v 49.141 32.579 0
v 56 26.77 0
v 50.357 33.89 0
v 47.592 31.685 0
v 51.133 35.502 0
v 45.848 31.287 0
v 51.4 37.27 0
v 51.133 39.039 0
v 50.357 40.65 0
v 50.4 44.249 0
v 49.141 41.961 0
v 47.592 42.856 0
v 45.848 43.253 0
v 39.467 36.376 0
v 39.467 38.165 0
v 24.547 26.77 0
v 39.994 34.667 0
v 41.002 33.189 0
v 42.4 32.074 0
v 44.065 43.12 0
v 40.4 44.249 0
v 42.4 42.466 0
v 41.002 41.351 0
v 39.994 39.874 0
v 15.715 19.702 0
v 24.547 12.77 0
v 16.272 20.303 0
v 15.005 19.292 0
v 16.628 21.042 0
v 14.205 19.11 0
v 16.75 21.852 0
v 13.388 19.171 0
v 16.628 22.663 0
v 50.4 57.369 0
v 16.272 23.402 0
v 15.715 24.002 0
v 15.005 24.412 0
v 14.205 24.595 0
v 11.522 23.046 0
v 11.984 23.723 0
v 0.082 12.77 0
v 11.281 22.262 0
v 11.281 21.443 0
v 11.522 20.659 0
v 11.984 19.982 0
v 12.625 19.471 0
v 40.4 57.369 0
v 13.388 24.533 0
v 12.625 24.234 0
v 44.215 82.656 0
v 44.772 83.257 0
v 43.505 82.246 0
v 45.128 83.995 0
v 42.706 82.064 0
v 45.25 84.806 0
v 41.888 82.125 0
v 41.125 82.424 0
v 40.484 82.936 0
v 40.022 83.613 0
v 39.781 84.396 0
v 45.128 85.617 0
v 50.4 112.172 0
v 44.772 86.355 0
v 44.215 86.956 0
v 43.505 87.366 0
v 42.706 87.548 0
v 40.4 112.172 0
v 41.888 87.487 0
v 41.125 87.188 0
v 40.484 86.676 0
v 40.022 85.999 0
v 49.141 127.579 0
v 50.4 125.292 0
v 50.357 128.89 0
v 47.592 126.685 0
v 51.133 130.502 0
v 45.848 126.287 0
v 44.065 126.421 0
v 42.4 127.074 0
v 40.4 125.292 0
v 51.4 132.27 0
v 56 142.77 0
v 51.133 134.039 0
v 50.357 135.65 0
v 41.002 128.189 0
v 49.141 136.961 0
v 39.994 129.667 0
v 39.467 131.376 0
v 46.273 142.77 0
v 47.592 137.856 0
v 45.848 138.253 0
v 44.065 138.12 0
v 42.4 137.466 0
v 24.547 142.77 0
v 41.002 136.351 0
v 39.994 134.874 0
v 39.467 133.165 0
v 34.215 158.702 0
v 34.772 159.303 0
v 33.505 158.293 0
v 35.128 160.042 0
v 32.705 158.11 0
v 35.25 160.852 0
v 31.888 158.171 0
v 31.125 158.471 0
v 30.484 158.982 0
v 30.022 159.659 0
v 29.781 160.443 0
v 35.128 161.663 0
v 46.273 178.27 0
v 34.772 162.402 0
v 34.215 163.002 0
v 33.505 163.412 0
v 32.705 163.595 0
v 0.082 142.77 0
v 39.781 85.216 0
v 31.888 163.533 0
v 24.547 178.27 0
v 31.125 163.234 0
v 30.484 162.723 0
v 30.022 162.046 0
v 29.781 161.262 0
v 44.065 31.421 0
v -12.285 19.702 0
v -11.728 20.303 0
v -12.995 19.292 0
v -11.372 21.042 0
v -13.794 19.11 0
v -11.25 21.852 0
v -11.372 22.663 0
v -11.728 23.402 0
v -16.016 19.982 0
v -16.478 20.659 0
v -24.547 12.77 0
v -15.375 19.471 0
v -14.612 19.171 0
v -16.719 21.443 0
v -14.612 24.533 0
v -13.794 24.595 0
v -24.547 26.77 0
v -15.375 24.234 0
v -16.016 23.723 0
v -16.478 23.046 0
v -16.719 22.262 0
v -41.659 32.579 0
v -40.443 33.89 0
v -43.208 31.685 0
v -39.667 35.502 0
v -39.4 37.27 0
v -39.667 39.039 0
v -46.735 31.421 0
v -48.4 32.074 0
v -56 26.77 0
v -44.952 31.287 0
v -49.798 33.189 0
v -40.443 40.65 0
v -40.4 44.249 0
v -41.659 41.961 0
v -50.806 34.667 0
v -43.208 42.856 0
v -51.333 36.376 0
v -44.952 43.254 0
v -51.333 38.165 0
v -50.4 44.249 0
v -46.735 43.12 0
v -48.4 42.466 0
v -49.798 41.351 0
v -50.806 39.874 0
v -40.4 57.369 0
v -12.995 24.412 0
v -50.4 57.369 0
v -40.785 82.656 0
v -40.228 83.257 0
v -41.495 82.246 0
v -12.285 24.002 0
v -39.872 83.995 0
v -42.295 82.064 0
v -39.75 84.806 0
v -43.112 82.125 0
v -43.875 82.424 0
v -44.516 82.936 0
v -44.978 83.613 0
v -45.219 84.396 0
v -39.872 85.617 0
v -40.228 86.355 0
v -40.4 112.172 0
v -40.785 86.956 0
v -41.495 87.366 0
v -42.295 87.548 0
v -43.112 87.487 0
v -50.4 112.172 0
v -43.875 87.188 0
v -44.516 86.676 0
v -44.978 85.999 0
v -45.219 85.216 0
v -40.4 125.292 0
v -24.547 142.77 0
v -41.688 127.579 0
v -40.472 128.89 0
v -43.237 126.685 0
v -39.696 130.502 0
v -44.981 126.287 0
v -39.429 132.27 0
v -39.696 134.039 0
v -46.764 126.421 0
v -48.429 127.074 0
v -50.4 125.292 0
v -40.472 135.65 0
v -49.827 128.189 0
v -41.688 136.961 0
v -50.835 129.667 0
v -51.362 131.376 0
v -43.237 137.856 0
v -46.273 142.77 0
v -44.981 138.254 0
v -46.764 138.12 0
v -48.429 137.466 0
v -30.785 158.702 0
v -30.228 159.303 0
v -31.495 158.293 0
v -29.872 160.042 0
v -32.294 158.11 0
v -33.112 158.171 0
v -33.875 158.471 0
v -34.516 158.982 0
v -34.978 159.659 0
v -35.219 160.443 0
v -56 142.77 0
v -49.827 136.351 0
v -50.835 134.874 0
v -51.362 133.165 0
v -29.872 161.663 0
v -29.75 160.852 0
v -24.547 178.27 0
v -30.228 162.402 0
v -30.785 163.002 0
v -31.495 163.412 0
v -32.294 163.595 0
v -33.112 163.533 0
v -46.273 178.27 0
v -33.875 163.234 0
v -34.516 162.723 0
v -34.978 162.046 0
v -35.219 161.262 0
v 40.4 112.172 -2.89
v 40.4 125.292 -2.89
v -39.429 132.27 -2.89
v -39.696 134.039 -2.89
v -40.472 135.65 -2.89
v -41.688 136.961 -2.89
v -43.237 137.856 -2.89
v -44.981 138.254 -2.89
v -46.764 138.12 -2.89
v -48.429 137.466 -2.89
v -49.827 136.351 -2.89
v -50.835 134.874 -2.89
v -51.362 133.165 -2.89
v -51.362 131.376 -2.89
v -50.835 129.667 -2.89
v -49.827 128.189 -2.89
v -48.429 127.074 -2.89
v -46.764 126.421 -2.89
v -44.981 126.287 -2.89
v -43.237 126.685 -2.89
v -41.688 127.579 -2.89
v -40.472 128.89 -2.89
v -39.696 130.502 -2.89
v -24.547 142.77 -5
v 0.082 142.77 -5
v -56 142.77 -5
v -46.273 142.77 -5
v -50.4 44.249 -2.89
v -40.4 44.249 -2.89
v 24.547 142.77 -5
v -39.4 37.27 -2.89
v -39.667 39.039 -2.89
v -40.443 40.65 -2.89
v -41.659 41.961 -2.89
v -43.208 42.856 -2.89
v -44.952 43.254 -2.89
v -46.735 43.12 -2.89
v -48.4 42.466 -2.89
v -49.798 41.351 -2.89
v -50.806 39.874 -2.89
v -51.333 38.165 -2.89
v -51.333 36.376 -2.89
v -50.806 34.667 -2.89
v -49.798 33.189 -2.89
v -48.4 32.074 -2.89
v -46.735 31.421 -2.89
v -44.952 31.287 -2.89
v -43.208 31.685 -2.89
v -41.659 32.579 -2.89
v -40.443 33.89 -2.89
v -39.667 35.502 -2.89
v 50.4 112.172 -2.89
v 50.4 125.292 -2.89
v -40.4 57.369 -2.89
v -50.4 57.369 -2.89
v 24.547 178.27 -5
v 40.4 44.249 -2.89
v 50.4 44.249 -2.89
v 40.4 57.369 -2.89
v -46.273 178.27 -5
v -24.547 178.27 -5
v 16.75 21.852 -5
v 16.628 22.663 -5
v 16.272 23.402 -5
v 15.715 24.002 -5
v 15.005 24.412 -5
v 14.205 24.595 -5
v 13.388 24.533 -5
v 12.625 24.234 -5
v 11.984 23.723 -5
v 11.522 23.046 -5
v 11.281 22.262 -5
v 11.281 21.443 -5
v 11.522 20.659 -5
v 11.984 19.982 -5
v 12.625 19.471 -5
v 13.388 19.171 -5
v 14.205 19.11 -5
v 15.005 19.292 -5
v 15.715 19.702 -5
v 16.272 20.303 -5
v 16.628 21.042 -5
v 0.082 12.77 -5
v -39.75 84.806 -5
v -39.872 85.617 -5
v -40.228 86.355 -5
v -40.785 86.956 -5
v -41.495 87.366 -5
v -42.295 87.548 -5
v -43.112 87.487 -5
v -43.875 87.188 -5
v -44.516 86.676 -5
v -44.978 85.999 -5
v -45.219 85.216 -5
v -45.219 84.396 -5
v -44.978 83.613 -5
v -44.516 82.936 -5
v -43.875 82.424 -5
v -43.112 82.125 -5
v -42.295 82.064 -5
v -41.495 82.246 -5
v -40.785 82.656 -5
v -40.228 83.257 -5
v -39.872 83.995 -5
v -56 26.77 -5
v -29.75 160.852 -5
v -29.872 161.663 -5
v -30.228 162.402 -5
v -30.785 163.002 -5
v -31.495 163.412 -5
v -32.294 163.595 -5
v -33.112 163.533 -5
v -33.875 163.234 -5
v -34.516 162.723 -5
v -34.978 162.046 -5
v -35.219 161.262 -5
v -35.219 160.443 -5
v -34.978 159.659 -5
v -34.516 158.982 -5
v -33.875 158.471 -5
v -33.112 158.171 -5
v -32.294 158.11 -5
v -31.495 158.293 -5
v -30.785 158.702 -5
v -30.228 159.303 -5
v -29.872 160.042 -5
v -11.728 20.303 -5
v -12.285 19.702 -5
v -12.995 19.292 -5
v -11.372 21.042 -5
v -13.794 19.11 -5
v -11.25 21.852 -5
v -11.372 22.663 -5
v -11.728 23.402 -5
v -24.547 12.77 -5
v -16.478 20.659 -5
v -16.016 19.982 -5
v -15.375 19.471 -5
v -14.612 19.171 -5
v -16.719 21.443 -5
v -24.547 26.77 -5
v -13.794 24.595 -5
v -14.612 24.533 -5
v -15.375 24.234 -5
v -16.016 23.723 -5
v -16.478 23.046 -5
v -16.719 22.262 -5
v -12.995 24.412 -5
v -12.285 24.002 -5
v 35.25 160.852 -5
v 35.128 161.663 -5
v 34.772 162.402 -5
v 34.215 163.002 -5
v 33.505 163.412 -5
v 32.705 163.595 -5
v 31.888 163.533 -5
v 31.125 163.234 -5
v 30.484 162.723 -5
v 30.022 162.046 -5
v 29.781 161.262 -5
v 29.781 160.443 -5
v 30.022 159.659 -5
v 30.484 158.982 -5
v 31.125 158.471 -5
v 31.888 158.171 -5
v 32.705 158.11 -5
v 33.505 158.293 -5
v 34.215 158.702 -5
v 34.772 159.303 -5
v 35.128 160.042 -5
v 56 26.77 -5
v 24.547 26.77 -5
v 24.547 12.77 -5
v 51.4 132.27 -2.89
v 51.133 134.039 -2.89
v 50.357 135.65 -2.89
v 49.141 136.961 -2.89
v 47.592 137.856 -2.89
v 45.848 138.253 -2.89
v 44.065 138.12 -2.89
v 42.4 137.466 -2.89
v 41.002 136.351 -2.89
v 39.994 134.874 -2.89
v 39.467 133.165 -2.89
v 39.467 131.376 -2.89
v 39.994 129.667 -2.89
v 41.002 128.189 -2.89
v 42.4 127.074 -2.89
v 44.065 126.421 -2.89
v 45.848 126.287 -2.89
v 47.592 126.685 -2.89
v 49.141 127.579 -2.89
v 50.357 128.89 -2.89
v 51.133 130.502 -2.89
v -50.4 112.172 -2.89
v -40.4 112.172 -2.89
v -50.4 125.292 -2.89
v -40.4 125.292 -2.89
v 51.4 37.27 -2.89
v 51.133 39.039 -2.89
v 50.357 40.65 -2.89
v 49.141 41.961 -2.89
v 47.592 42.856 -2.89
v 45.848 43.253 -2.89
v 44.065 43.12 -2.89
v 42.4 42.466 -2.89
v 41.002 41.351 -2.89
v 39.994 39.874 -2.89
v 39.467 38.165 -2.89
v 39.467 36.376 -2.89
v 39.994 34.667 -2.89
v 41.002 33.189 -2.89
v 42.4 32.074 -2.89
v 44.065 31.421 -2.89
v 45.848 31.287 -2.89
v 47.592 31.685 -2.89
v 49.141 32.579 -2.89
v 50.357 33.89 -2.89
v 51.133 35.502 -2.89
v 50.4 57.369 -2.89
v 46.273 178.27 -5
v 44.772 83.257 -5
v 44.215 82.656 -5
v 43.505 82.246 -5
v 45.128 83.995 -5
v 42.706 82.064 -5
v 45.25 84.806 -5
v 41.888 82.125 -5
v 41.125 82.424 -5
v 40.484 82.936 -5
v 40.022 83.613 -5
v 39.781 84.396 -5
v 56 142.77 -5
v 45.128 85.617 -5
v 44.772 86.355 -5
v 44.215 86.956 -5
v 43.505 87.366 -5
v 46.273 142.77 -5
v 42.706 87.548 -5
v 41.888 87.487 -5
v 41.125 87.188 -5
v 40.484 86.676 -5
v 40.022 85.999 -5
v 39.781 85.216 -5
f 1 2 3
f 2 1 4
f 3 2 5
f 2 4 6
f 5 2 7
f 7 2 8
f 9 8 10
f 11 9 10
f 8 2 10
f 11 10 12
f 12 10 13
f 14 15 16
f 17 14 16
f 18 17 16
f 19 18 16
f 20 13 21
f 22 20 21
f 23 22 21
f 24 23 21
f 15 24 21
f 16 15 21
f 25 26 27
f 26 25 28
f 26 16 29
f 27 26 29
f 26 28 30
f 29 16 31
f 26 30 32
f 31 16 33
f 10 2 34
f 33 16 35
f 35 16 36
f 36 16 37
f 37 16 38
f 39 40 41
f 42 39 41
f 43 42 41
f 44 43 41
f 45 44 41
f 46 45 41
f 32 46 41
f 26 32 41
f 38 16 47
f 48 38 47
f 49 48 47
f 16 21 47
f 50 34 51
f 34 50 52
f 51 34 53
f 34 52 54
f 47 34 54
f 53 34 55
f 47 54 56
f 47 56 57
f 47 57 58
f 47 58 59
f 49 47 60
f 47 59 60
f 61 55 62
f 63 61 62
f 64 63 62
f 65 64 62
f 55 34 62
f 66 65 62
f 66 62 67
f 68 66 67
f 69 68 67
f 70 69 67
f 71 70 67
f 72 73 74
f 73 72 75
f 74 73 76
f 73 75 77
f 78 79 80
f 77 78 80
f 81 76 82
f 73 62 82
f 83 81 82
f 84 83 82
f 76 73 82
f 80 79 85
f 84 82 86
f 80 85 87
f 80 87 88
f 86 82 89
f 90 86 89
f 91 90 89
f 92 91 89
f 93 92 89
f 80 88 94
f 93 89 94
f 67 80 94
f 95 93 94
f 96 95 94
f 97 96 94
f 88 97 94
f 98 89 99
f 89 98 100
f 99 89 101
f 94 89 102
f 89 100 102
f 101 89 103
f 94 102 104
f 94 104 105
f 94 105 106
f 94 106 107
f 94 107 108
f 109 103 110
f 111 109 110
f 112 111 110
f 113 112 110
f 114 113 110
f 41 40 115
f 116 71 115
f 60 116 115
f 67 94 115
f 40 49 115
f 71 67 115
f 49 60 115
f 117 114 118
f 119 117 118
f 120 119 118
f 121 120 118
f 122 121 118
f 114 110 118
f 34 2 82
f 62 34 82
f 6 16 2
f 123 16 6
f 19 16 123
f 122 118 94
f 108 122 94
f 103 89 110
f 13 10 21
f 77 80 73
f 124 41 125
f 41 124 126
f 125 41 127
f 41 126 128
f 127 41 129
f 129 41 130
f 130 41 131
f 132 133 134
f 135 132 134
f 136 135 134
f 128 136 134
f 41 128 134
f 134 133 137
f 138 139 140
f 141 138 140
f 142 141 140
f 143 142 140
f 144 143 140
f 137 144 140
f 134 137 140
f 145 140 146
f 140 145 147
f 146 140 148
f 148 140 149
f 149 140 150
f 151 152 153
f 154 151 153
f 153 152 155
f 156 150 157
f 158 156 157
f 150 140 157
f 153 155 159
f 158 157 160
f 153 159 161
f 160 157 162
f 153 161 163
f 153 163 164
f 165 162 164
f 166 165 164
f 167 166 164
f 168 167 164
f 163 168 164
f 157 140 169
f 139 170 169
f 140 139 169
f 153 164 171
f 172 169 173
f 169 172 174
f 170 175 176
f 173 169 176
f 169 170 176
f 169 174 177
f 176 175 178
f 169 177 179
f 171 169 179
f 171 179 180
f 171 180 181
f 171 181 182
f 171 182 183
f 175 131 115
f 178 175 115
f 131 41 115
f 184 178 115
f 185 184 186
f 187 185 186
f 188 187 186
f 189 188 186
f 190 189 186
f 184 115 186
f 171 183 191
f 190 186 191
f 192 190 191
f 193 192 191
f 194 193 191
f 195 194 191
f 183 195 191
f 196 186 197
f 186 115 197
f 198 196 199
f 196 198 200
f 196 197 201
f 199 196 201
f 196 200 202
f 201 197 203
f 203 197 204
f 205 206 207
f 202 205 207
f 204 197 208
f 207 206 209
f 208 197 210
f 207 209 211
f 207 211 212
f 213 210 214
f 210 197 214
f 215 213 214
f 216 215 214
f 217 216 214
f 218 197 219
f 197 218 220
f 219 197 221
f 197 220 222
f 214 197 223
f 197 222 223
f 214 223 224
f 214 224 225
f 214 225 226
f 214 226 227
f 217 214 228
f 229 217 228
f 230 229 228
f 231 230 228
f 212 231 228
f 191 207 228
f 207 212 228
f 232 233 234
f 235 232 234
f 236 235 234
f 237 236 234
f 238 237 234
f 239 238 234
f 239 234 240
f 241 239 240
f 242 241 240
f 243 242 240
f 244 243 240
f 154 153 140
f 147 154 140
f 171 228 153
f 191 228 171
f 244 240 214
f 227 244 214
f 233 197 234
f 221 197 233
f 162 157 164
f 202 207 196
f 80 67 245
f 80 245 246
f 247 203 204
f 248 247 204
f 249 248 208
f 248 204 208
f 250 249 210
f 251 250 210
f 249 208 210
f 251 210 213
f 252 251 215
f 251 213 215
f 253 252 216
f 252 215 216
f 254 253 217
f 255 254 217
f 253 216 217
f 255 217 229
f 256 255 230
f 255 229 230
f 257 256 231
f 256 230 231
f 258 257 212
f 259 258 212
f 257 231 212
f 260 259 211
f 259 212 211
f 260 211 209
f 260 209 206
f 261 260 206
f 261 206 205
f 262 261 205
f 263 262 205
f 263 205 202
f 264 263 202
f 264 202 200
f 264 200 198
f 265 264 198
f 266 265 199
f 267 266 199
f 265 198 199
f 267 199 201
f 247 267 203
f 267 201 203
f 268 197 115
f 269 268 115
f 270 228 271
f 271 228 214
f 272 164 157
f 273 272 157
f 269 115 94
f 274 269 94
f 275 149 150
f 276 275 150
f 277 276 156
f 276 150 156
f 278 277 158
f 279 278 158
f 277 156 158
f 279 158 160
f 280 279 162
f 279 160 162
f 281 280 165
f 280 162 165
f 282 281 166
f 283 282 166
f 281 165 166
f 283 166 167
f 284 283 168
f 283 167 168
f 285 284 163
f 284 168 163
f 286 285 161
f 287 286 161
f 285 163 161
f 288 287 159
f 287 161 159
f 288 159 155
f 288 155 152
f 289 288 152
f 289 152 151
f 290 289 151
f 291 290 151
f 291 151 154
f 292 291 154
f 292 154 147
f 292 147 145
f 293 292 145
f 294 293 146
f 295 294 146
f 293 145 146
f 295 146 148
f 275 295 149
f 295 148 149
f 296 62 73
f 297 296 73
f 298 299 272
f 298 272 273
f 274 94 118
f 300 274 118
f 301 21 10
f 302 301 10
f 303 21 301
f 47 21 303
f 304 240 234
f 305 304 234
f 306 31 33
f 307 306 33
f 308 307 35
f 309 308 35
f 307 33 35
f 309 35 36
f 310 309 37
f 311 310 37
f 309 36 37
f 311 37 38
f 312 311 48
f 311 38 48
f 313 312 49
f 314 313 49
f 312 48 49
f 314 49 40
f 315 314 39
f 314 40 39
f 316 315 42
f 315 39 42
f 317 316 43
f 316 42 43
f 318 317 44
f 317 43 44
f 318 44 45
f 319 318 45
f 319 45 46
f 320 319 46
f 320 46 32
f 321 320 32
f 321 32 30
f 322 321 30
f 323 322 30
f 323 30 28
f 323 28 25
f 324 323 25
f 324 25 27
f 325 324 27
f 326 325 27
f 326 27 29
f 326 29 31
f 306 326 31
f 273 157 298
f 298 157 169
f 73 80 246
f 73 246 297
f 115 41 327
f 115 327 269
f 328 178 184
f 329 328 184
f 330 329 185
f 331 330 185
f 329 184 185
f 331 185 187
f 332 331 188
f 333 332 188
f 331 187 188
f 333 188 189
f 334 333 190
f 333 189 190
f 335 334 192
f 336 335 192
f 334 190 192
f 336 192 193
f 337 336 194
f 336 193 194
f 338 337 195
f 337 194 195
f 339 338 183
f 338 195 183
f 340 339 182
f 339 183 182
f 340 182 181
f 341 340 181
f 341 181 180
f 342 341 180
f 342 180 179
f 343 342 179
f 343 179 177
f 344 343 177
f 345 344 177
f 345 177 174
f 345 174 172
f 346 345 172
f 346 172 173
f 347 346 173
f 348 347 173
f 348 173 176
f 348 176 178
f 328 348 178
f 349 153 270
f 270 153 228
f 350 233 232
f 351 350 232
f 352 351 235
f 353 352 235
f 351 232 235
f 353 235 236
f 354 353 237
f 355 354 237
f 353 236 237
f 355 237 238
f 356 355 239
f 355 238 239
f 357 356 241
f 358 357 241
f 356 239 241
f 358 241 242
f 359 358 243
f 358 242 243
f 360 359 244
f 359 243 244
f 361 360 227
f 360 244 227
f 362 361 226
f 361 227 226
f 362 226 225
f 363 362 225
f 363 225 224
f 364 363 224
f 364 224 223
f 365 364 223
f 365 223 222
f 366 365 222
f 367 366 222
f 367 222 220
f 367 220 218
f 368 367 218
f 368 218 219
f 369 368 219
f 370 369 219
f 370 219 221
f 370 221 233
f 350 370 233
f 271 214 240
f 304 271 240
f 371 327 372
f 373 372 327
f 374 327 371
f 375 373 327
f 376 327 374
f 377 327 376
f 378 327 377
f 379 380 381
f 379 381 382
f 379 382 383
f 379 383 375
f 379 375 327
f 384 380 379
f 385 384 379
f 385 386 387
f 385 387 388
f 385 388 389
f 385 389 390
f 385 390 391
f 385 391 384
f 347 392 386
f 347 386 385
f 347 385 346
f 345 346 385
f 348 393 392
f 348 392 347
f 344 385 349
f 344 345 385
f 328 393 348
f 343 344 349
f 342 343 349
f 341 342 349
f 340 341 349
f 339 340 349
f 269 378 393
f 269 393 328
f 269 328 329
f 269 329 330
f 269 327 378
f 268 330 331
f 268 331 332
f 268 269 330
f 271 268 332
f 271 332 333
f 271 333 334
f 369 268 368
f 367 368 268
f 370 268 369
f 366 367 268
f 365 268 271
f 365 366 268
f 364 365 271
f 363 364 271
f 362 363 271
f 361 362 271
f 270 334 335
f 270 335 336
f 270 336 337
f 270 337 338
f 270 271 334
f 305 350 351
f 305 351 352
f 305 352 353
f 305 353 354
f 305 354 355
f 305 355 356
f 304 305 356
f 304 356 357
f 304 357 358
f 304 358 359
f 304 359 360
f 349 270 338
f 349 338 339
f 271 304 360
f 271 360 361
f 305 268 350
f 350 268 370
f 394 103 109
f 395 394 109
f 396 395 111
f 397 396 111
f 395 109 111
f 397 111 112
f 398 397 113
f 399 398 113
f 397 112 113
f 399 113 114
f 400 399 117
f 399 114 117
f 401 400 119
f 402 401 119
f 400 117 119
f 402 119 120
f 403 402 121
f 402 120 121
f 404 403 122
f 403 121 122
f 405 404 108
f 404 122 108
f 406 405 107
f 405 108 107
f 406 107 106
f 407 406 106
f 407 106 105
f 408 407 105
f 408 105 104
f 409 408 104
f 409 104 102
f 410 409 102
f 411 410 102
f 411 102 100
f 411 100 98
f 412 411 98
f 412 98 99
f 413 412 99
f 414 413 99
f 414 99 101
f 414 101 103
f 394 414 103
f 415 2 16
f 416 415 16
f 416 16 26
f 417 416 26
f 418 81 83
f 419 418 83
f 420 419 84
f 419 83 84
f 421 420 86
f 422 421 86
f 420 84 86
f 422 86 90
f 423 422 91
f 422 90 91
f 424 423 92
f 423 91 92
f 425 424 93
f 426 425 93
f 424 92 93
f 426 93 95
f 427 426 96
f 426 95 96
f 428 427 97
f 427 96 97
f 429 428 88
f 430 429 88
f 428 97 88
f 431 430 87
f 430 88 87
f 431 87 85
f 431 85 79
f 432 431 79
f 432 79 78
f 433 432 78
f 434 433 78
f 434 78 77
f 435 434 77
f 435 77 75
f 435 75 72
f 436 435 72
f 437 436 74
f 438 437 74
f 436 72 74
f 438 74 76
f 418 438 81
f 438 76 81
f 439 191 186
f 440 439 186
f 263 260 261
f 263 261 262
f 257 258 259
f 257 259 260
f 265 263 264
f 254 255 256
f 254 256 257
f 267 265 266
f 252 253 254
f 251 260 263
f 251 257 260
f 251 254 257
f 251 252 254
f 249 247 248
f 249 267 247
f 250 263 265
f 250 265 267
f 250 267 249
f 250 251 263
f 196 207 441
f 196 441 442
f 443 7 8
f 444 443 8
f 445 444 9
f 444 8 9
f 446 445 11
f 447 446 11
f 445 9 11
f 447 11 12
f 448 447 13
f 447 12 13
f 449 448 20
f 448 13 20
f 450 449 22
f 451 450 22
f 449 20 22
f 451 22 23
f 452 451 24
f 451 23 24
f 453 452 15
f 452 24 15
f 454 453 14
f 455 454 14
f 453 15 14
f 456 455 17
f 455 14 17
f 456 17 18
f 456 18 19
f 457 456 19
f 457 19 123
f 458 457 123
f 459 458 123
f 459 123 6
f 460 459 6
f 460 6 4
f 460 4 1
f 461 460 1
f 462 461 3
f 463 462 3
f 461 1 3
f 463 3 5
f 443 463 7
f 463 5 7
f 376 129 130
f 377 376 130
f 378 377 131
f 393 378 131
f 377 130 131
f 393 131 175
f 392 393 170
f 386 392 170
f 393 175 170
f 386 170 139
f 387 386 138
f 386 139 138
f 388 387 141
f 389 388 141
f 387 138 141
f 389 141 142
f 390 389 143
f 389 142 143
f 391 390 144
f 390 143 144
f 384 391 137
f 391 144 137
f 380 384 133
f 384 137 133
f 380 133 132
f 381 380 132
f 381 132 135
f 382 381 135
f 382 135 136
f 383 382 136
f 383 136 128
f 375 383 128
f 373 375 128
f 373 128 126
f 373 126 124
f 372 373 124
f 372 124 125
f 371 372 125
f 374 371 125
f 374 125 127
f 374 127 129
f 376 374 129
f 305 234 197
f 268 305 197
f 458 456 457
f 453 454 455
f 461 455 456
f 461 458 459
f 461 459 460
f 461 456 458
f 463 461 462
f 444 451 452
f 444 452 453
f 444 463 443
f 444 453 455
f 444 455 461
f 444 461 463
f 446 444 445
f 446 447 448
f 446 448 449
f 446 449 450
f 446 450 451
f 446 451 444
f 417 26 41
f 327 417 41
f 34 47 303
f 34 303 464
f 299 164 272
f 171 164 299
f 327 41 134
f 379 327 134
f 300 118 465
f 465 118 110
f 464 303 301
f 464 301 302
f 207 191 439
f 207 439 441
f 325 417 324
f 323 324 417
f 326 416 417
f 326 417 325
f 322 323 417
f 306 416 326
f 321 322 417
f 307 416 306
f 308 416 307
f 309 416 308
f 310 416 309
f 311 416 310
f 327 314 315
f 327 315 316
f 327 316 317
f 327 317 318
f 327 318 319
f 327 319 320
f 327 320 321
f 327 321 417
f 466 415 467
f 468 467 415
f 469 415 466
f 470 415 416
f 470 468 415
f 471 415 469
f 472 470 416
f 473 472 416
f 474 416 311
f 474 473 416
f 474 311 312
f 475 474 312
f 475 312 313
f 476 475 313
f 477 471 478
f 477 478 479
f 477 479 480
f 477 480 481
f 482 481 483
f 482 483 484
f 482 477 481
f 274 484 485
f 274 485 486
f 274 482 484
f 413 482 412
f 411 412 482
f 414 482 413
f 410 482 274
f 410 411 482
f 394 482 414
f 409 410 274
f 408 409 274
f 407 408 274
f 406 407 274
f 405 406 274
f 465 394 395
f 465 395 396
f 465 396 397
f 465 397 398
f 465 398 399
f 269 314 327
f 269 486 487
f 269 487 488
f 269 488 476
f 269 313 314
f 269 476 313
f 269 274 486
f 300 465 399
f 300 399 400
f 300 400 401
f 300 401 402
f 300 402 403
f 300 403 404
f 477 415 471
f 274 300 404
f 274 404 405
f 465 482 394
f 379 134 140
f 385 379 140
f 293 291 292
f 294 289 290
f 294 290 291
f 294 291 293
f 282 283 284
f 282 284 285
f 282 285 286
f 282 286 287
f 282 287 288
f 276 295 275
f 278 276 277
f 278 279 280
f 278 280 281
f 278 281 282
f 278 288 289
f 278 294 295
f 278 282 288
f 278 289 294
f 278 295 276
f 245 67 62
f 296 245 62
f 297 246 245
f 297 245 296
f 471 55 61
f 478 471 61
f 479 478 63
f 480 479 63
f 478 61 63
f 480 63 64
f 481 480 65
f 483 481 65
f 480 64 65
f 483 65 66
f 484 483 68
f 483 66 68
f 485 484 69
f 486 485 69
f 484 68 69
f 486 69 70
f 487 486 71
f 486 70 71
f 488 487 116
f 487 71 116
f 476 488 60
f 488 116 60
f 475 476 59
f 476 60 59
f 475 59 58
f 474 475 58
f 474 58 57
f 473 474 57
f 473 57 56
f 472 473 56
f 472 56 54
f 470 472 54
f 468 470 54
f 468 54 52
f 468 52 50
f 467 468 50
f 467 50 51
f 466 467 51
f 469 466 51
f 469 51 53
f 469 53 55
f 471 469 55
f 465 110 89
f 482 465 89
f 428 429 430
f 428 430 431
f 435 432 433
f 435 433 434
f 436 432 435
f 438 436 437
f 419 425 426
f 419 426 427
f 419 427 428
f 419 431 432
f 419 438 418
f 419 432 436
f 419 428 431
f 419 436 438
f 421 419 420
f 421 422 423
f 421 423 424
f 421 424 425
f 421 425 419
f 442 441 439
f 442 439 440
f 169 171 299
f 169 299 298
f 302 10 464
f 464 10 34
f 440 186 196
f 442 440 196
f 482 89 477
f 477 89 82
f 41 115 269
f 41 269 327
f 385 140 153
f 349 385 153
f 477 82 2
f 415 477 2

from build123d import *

# Parameters (mm, degrees)
BOSS_EXTRUDE1_DEPTH = 5
SKETCH3_R           = 2.750001848
SKETCH3_R_2         = 2.749998122
SKETCH3_R_3         = 2.749994397
CUT_EXTRUDE1_DEPTH  = 187.925914257
SKETCH4_R           = 5.999999003
SKETCH4_R_2         = 6.000067841
SKETCH4_W           = 9.999997914
SKETCH4_H           = 13.120189309
CUT_EXTRUDE4_DEPTH  = 2.89
BOSS_EXTRUDE2_DEPTH = 5
SKETCH6_R           = 2.749994397
SKETCH6_R_2         = 2.750000188
SKETCH6_R_3         = 2.750001848
CUT_EXTRUDE5_DEPTH  = 187.925914257
SKETCH7_R           = 5.999997258
SKETCH7_R_2         = 5.99999962
SKETCH7_W           = 9.999997914
SKETCH7_H           = 13.120189309
CUT_EXTRUDE13_DEPTH = 2.89


with BuildPart() as part:
    # Sketch1 → Boss-Extrude1 (new body)
    with BuildSketch(Plane.XY):
        Polygon((-24.546734989, 142.770305276), (0.08200459, 142.770305276), (0.08200459, 26.770308614), (0.08200459, 12.770309113), (-24.546734989, 12.770309113), (-24.546734989, 26.770308614), (-55.999945849, 26.770308614), (-55.999945849, 142.770305276), (-46.273332089, 142.770305276), (-46.273332089, 178.270310163), (-24.546734989, 178.270310163), align=None)
    extrude(amount=-BOSS_EXTRUDE1_DEPTH)

    # Sketch3 → Cut-Extrude1 (cut, through all)
    with BuildSketch(Plane.XY):
        with Locations((-13.999991119, 21.852403879)):
            Circle(SKETCH3_R)
        with Locations((-42.500052601, 84.806021303)):
            Circle(SKETCH3_R_2)
        with Locations((-32.499950379, 160.85241735)):
            Circle(SKETCH3_R_3)
    extrude(amount=-CUT_EXTRUDE1_DEPTH, mode=Mode.SUBTRACT)

    # Sketch4 → Cut-Extrude4 (cut)
    with BuildSketch(Plane.XY):
        with Locations((-45.399973286, 37.270279719)):
            Circle(SKETCH4_R)
        with Locations((-45.429093073, 132.270276546)):
            Circle(SKETCH4_R_2)
        with Locations((-45.399982482, 50.808746368)):
            Rectangle(SKETCH4_W, SKETCH4_H)
        with Locations((-45.399978757, 118.73177439)):
            Rectangle(SKETCH4_W, SKETCH4_H)
    extrude(amount=-CUT_EXTRUDE4_DEPTH, mode=Mode.SUBTRACT)


with BuildPart() as body_2:
    # Sketch5 → Boss-Extrude2 (new body)
    with BuildSketch(Plane.XY):
        Polygon((46.273332089, 142.770305276), (55.999945849, 142.770305276), (55.999945849, 26.770308614), (24.546734989, 26.770308614), (24.546734989, 12.770309113), (0.08200459, 12.770309113), (0.08200459, 26.770308614), (0.08200459, 142.770305276), (24.546734989, 142.770305276), (24.546734989, 178.270310163), (46.273332089, 178.270310163), align=None)
    extrude(amount=-BOSS_EXTRUDE2_DEPTH)

    # Sketch6 → Cut-Extrude5 (cut, through all)
    with BuildSketch(Plane.XY):
        with Locations((32.499950267, 160.85241735)):
            Circle(SKETCH6_R)
        with Locations((42.50005426, 84.806023369)):
            Circle(SKETCH6_R_2)
        with Locations((13.999977744, 21.852403879)):
            Circle(SKETCH6_R_3)
    extrude(amount=-CUT_EXTRUDE5_DEPTH, mode=Mode.SUBTRACT)

    # Sketch7 → Cut-Extrude13 (cut)
    with BuildSketch(Plane.XY):
        with Locations((45.399993658, 132.270276546)):
            Circle(SKETCH7_R)
        with Locations((45.399971013, 37.270276375)):
            Circle(SKETCH7_R_2)
        with Locations((45.399978757, 118.73177439)):
            Rectangle(SKETCH7_W, SKETCH7_H)
        with Locations((45.399982482, 50.808746368)):
            Rectangle(SKETCH7_W, SKETCH7_H)
    extrude(amount=-CUT_EXTRUDE13_DEPTH, mode=Mode.SUBTRACT)


solid = Compound([part.part, body_2.part])
